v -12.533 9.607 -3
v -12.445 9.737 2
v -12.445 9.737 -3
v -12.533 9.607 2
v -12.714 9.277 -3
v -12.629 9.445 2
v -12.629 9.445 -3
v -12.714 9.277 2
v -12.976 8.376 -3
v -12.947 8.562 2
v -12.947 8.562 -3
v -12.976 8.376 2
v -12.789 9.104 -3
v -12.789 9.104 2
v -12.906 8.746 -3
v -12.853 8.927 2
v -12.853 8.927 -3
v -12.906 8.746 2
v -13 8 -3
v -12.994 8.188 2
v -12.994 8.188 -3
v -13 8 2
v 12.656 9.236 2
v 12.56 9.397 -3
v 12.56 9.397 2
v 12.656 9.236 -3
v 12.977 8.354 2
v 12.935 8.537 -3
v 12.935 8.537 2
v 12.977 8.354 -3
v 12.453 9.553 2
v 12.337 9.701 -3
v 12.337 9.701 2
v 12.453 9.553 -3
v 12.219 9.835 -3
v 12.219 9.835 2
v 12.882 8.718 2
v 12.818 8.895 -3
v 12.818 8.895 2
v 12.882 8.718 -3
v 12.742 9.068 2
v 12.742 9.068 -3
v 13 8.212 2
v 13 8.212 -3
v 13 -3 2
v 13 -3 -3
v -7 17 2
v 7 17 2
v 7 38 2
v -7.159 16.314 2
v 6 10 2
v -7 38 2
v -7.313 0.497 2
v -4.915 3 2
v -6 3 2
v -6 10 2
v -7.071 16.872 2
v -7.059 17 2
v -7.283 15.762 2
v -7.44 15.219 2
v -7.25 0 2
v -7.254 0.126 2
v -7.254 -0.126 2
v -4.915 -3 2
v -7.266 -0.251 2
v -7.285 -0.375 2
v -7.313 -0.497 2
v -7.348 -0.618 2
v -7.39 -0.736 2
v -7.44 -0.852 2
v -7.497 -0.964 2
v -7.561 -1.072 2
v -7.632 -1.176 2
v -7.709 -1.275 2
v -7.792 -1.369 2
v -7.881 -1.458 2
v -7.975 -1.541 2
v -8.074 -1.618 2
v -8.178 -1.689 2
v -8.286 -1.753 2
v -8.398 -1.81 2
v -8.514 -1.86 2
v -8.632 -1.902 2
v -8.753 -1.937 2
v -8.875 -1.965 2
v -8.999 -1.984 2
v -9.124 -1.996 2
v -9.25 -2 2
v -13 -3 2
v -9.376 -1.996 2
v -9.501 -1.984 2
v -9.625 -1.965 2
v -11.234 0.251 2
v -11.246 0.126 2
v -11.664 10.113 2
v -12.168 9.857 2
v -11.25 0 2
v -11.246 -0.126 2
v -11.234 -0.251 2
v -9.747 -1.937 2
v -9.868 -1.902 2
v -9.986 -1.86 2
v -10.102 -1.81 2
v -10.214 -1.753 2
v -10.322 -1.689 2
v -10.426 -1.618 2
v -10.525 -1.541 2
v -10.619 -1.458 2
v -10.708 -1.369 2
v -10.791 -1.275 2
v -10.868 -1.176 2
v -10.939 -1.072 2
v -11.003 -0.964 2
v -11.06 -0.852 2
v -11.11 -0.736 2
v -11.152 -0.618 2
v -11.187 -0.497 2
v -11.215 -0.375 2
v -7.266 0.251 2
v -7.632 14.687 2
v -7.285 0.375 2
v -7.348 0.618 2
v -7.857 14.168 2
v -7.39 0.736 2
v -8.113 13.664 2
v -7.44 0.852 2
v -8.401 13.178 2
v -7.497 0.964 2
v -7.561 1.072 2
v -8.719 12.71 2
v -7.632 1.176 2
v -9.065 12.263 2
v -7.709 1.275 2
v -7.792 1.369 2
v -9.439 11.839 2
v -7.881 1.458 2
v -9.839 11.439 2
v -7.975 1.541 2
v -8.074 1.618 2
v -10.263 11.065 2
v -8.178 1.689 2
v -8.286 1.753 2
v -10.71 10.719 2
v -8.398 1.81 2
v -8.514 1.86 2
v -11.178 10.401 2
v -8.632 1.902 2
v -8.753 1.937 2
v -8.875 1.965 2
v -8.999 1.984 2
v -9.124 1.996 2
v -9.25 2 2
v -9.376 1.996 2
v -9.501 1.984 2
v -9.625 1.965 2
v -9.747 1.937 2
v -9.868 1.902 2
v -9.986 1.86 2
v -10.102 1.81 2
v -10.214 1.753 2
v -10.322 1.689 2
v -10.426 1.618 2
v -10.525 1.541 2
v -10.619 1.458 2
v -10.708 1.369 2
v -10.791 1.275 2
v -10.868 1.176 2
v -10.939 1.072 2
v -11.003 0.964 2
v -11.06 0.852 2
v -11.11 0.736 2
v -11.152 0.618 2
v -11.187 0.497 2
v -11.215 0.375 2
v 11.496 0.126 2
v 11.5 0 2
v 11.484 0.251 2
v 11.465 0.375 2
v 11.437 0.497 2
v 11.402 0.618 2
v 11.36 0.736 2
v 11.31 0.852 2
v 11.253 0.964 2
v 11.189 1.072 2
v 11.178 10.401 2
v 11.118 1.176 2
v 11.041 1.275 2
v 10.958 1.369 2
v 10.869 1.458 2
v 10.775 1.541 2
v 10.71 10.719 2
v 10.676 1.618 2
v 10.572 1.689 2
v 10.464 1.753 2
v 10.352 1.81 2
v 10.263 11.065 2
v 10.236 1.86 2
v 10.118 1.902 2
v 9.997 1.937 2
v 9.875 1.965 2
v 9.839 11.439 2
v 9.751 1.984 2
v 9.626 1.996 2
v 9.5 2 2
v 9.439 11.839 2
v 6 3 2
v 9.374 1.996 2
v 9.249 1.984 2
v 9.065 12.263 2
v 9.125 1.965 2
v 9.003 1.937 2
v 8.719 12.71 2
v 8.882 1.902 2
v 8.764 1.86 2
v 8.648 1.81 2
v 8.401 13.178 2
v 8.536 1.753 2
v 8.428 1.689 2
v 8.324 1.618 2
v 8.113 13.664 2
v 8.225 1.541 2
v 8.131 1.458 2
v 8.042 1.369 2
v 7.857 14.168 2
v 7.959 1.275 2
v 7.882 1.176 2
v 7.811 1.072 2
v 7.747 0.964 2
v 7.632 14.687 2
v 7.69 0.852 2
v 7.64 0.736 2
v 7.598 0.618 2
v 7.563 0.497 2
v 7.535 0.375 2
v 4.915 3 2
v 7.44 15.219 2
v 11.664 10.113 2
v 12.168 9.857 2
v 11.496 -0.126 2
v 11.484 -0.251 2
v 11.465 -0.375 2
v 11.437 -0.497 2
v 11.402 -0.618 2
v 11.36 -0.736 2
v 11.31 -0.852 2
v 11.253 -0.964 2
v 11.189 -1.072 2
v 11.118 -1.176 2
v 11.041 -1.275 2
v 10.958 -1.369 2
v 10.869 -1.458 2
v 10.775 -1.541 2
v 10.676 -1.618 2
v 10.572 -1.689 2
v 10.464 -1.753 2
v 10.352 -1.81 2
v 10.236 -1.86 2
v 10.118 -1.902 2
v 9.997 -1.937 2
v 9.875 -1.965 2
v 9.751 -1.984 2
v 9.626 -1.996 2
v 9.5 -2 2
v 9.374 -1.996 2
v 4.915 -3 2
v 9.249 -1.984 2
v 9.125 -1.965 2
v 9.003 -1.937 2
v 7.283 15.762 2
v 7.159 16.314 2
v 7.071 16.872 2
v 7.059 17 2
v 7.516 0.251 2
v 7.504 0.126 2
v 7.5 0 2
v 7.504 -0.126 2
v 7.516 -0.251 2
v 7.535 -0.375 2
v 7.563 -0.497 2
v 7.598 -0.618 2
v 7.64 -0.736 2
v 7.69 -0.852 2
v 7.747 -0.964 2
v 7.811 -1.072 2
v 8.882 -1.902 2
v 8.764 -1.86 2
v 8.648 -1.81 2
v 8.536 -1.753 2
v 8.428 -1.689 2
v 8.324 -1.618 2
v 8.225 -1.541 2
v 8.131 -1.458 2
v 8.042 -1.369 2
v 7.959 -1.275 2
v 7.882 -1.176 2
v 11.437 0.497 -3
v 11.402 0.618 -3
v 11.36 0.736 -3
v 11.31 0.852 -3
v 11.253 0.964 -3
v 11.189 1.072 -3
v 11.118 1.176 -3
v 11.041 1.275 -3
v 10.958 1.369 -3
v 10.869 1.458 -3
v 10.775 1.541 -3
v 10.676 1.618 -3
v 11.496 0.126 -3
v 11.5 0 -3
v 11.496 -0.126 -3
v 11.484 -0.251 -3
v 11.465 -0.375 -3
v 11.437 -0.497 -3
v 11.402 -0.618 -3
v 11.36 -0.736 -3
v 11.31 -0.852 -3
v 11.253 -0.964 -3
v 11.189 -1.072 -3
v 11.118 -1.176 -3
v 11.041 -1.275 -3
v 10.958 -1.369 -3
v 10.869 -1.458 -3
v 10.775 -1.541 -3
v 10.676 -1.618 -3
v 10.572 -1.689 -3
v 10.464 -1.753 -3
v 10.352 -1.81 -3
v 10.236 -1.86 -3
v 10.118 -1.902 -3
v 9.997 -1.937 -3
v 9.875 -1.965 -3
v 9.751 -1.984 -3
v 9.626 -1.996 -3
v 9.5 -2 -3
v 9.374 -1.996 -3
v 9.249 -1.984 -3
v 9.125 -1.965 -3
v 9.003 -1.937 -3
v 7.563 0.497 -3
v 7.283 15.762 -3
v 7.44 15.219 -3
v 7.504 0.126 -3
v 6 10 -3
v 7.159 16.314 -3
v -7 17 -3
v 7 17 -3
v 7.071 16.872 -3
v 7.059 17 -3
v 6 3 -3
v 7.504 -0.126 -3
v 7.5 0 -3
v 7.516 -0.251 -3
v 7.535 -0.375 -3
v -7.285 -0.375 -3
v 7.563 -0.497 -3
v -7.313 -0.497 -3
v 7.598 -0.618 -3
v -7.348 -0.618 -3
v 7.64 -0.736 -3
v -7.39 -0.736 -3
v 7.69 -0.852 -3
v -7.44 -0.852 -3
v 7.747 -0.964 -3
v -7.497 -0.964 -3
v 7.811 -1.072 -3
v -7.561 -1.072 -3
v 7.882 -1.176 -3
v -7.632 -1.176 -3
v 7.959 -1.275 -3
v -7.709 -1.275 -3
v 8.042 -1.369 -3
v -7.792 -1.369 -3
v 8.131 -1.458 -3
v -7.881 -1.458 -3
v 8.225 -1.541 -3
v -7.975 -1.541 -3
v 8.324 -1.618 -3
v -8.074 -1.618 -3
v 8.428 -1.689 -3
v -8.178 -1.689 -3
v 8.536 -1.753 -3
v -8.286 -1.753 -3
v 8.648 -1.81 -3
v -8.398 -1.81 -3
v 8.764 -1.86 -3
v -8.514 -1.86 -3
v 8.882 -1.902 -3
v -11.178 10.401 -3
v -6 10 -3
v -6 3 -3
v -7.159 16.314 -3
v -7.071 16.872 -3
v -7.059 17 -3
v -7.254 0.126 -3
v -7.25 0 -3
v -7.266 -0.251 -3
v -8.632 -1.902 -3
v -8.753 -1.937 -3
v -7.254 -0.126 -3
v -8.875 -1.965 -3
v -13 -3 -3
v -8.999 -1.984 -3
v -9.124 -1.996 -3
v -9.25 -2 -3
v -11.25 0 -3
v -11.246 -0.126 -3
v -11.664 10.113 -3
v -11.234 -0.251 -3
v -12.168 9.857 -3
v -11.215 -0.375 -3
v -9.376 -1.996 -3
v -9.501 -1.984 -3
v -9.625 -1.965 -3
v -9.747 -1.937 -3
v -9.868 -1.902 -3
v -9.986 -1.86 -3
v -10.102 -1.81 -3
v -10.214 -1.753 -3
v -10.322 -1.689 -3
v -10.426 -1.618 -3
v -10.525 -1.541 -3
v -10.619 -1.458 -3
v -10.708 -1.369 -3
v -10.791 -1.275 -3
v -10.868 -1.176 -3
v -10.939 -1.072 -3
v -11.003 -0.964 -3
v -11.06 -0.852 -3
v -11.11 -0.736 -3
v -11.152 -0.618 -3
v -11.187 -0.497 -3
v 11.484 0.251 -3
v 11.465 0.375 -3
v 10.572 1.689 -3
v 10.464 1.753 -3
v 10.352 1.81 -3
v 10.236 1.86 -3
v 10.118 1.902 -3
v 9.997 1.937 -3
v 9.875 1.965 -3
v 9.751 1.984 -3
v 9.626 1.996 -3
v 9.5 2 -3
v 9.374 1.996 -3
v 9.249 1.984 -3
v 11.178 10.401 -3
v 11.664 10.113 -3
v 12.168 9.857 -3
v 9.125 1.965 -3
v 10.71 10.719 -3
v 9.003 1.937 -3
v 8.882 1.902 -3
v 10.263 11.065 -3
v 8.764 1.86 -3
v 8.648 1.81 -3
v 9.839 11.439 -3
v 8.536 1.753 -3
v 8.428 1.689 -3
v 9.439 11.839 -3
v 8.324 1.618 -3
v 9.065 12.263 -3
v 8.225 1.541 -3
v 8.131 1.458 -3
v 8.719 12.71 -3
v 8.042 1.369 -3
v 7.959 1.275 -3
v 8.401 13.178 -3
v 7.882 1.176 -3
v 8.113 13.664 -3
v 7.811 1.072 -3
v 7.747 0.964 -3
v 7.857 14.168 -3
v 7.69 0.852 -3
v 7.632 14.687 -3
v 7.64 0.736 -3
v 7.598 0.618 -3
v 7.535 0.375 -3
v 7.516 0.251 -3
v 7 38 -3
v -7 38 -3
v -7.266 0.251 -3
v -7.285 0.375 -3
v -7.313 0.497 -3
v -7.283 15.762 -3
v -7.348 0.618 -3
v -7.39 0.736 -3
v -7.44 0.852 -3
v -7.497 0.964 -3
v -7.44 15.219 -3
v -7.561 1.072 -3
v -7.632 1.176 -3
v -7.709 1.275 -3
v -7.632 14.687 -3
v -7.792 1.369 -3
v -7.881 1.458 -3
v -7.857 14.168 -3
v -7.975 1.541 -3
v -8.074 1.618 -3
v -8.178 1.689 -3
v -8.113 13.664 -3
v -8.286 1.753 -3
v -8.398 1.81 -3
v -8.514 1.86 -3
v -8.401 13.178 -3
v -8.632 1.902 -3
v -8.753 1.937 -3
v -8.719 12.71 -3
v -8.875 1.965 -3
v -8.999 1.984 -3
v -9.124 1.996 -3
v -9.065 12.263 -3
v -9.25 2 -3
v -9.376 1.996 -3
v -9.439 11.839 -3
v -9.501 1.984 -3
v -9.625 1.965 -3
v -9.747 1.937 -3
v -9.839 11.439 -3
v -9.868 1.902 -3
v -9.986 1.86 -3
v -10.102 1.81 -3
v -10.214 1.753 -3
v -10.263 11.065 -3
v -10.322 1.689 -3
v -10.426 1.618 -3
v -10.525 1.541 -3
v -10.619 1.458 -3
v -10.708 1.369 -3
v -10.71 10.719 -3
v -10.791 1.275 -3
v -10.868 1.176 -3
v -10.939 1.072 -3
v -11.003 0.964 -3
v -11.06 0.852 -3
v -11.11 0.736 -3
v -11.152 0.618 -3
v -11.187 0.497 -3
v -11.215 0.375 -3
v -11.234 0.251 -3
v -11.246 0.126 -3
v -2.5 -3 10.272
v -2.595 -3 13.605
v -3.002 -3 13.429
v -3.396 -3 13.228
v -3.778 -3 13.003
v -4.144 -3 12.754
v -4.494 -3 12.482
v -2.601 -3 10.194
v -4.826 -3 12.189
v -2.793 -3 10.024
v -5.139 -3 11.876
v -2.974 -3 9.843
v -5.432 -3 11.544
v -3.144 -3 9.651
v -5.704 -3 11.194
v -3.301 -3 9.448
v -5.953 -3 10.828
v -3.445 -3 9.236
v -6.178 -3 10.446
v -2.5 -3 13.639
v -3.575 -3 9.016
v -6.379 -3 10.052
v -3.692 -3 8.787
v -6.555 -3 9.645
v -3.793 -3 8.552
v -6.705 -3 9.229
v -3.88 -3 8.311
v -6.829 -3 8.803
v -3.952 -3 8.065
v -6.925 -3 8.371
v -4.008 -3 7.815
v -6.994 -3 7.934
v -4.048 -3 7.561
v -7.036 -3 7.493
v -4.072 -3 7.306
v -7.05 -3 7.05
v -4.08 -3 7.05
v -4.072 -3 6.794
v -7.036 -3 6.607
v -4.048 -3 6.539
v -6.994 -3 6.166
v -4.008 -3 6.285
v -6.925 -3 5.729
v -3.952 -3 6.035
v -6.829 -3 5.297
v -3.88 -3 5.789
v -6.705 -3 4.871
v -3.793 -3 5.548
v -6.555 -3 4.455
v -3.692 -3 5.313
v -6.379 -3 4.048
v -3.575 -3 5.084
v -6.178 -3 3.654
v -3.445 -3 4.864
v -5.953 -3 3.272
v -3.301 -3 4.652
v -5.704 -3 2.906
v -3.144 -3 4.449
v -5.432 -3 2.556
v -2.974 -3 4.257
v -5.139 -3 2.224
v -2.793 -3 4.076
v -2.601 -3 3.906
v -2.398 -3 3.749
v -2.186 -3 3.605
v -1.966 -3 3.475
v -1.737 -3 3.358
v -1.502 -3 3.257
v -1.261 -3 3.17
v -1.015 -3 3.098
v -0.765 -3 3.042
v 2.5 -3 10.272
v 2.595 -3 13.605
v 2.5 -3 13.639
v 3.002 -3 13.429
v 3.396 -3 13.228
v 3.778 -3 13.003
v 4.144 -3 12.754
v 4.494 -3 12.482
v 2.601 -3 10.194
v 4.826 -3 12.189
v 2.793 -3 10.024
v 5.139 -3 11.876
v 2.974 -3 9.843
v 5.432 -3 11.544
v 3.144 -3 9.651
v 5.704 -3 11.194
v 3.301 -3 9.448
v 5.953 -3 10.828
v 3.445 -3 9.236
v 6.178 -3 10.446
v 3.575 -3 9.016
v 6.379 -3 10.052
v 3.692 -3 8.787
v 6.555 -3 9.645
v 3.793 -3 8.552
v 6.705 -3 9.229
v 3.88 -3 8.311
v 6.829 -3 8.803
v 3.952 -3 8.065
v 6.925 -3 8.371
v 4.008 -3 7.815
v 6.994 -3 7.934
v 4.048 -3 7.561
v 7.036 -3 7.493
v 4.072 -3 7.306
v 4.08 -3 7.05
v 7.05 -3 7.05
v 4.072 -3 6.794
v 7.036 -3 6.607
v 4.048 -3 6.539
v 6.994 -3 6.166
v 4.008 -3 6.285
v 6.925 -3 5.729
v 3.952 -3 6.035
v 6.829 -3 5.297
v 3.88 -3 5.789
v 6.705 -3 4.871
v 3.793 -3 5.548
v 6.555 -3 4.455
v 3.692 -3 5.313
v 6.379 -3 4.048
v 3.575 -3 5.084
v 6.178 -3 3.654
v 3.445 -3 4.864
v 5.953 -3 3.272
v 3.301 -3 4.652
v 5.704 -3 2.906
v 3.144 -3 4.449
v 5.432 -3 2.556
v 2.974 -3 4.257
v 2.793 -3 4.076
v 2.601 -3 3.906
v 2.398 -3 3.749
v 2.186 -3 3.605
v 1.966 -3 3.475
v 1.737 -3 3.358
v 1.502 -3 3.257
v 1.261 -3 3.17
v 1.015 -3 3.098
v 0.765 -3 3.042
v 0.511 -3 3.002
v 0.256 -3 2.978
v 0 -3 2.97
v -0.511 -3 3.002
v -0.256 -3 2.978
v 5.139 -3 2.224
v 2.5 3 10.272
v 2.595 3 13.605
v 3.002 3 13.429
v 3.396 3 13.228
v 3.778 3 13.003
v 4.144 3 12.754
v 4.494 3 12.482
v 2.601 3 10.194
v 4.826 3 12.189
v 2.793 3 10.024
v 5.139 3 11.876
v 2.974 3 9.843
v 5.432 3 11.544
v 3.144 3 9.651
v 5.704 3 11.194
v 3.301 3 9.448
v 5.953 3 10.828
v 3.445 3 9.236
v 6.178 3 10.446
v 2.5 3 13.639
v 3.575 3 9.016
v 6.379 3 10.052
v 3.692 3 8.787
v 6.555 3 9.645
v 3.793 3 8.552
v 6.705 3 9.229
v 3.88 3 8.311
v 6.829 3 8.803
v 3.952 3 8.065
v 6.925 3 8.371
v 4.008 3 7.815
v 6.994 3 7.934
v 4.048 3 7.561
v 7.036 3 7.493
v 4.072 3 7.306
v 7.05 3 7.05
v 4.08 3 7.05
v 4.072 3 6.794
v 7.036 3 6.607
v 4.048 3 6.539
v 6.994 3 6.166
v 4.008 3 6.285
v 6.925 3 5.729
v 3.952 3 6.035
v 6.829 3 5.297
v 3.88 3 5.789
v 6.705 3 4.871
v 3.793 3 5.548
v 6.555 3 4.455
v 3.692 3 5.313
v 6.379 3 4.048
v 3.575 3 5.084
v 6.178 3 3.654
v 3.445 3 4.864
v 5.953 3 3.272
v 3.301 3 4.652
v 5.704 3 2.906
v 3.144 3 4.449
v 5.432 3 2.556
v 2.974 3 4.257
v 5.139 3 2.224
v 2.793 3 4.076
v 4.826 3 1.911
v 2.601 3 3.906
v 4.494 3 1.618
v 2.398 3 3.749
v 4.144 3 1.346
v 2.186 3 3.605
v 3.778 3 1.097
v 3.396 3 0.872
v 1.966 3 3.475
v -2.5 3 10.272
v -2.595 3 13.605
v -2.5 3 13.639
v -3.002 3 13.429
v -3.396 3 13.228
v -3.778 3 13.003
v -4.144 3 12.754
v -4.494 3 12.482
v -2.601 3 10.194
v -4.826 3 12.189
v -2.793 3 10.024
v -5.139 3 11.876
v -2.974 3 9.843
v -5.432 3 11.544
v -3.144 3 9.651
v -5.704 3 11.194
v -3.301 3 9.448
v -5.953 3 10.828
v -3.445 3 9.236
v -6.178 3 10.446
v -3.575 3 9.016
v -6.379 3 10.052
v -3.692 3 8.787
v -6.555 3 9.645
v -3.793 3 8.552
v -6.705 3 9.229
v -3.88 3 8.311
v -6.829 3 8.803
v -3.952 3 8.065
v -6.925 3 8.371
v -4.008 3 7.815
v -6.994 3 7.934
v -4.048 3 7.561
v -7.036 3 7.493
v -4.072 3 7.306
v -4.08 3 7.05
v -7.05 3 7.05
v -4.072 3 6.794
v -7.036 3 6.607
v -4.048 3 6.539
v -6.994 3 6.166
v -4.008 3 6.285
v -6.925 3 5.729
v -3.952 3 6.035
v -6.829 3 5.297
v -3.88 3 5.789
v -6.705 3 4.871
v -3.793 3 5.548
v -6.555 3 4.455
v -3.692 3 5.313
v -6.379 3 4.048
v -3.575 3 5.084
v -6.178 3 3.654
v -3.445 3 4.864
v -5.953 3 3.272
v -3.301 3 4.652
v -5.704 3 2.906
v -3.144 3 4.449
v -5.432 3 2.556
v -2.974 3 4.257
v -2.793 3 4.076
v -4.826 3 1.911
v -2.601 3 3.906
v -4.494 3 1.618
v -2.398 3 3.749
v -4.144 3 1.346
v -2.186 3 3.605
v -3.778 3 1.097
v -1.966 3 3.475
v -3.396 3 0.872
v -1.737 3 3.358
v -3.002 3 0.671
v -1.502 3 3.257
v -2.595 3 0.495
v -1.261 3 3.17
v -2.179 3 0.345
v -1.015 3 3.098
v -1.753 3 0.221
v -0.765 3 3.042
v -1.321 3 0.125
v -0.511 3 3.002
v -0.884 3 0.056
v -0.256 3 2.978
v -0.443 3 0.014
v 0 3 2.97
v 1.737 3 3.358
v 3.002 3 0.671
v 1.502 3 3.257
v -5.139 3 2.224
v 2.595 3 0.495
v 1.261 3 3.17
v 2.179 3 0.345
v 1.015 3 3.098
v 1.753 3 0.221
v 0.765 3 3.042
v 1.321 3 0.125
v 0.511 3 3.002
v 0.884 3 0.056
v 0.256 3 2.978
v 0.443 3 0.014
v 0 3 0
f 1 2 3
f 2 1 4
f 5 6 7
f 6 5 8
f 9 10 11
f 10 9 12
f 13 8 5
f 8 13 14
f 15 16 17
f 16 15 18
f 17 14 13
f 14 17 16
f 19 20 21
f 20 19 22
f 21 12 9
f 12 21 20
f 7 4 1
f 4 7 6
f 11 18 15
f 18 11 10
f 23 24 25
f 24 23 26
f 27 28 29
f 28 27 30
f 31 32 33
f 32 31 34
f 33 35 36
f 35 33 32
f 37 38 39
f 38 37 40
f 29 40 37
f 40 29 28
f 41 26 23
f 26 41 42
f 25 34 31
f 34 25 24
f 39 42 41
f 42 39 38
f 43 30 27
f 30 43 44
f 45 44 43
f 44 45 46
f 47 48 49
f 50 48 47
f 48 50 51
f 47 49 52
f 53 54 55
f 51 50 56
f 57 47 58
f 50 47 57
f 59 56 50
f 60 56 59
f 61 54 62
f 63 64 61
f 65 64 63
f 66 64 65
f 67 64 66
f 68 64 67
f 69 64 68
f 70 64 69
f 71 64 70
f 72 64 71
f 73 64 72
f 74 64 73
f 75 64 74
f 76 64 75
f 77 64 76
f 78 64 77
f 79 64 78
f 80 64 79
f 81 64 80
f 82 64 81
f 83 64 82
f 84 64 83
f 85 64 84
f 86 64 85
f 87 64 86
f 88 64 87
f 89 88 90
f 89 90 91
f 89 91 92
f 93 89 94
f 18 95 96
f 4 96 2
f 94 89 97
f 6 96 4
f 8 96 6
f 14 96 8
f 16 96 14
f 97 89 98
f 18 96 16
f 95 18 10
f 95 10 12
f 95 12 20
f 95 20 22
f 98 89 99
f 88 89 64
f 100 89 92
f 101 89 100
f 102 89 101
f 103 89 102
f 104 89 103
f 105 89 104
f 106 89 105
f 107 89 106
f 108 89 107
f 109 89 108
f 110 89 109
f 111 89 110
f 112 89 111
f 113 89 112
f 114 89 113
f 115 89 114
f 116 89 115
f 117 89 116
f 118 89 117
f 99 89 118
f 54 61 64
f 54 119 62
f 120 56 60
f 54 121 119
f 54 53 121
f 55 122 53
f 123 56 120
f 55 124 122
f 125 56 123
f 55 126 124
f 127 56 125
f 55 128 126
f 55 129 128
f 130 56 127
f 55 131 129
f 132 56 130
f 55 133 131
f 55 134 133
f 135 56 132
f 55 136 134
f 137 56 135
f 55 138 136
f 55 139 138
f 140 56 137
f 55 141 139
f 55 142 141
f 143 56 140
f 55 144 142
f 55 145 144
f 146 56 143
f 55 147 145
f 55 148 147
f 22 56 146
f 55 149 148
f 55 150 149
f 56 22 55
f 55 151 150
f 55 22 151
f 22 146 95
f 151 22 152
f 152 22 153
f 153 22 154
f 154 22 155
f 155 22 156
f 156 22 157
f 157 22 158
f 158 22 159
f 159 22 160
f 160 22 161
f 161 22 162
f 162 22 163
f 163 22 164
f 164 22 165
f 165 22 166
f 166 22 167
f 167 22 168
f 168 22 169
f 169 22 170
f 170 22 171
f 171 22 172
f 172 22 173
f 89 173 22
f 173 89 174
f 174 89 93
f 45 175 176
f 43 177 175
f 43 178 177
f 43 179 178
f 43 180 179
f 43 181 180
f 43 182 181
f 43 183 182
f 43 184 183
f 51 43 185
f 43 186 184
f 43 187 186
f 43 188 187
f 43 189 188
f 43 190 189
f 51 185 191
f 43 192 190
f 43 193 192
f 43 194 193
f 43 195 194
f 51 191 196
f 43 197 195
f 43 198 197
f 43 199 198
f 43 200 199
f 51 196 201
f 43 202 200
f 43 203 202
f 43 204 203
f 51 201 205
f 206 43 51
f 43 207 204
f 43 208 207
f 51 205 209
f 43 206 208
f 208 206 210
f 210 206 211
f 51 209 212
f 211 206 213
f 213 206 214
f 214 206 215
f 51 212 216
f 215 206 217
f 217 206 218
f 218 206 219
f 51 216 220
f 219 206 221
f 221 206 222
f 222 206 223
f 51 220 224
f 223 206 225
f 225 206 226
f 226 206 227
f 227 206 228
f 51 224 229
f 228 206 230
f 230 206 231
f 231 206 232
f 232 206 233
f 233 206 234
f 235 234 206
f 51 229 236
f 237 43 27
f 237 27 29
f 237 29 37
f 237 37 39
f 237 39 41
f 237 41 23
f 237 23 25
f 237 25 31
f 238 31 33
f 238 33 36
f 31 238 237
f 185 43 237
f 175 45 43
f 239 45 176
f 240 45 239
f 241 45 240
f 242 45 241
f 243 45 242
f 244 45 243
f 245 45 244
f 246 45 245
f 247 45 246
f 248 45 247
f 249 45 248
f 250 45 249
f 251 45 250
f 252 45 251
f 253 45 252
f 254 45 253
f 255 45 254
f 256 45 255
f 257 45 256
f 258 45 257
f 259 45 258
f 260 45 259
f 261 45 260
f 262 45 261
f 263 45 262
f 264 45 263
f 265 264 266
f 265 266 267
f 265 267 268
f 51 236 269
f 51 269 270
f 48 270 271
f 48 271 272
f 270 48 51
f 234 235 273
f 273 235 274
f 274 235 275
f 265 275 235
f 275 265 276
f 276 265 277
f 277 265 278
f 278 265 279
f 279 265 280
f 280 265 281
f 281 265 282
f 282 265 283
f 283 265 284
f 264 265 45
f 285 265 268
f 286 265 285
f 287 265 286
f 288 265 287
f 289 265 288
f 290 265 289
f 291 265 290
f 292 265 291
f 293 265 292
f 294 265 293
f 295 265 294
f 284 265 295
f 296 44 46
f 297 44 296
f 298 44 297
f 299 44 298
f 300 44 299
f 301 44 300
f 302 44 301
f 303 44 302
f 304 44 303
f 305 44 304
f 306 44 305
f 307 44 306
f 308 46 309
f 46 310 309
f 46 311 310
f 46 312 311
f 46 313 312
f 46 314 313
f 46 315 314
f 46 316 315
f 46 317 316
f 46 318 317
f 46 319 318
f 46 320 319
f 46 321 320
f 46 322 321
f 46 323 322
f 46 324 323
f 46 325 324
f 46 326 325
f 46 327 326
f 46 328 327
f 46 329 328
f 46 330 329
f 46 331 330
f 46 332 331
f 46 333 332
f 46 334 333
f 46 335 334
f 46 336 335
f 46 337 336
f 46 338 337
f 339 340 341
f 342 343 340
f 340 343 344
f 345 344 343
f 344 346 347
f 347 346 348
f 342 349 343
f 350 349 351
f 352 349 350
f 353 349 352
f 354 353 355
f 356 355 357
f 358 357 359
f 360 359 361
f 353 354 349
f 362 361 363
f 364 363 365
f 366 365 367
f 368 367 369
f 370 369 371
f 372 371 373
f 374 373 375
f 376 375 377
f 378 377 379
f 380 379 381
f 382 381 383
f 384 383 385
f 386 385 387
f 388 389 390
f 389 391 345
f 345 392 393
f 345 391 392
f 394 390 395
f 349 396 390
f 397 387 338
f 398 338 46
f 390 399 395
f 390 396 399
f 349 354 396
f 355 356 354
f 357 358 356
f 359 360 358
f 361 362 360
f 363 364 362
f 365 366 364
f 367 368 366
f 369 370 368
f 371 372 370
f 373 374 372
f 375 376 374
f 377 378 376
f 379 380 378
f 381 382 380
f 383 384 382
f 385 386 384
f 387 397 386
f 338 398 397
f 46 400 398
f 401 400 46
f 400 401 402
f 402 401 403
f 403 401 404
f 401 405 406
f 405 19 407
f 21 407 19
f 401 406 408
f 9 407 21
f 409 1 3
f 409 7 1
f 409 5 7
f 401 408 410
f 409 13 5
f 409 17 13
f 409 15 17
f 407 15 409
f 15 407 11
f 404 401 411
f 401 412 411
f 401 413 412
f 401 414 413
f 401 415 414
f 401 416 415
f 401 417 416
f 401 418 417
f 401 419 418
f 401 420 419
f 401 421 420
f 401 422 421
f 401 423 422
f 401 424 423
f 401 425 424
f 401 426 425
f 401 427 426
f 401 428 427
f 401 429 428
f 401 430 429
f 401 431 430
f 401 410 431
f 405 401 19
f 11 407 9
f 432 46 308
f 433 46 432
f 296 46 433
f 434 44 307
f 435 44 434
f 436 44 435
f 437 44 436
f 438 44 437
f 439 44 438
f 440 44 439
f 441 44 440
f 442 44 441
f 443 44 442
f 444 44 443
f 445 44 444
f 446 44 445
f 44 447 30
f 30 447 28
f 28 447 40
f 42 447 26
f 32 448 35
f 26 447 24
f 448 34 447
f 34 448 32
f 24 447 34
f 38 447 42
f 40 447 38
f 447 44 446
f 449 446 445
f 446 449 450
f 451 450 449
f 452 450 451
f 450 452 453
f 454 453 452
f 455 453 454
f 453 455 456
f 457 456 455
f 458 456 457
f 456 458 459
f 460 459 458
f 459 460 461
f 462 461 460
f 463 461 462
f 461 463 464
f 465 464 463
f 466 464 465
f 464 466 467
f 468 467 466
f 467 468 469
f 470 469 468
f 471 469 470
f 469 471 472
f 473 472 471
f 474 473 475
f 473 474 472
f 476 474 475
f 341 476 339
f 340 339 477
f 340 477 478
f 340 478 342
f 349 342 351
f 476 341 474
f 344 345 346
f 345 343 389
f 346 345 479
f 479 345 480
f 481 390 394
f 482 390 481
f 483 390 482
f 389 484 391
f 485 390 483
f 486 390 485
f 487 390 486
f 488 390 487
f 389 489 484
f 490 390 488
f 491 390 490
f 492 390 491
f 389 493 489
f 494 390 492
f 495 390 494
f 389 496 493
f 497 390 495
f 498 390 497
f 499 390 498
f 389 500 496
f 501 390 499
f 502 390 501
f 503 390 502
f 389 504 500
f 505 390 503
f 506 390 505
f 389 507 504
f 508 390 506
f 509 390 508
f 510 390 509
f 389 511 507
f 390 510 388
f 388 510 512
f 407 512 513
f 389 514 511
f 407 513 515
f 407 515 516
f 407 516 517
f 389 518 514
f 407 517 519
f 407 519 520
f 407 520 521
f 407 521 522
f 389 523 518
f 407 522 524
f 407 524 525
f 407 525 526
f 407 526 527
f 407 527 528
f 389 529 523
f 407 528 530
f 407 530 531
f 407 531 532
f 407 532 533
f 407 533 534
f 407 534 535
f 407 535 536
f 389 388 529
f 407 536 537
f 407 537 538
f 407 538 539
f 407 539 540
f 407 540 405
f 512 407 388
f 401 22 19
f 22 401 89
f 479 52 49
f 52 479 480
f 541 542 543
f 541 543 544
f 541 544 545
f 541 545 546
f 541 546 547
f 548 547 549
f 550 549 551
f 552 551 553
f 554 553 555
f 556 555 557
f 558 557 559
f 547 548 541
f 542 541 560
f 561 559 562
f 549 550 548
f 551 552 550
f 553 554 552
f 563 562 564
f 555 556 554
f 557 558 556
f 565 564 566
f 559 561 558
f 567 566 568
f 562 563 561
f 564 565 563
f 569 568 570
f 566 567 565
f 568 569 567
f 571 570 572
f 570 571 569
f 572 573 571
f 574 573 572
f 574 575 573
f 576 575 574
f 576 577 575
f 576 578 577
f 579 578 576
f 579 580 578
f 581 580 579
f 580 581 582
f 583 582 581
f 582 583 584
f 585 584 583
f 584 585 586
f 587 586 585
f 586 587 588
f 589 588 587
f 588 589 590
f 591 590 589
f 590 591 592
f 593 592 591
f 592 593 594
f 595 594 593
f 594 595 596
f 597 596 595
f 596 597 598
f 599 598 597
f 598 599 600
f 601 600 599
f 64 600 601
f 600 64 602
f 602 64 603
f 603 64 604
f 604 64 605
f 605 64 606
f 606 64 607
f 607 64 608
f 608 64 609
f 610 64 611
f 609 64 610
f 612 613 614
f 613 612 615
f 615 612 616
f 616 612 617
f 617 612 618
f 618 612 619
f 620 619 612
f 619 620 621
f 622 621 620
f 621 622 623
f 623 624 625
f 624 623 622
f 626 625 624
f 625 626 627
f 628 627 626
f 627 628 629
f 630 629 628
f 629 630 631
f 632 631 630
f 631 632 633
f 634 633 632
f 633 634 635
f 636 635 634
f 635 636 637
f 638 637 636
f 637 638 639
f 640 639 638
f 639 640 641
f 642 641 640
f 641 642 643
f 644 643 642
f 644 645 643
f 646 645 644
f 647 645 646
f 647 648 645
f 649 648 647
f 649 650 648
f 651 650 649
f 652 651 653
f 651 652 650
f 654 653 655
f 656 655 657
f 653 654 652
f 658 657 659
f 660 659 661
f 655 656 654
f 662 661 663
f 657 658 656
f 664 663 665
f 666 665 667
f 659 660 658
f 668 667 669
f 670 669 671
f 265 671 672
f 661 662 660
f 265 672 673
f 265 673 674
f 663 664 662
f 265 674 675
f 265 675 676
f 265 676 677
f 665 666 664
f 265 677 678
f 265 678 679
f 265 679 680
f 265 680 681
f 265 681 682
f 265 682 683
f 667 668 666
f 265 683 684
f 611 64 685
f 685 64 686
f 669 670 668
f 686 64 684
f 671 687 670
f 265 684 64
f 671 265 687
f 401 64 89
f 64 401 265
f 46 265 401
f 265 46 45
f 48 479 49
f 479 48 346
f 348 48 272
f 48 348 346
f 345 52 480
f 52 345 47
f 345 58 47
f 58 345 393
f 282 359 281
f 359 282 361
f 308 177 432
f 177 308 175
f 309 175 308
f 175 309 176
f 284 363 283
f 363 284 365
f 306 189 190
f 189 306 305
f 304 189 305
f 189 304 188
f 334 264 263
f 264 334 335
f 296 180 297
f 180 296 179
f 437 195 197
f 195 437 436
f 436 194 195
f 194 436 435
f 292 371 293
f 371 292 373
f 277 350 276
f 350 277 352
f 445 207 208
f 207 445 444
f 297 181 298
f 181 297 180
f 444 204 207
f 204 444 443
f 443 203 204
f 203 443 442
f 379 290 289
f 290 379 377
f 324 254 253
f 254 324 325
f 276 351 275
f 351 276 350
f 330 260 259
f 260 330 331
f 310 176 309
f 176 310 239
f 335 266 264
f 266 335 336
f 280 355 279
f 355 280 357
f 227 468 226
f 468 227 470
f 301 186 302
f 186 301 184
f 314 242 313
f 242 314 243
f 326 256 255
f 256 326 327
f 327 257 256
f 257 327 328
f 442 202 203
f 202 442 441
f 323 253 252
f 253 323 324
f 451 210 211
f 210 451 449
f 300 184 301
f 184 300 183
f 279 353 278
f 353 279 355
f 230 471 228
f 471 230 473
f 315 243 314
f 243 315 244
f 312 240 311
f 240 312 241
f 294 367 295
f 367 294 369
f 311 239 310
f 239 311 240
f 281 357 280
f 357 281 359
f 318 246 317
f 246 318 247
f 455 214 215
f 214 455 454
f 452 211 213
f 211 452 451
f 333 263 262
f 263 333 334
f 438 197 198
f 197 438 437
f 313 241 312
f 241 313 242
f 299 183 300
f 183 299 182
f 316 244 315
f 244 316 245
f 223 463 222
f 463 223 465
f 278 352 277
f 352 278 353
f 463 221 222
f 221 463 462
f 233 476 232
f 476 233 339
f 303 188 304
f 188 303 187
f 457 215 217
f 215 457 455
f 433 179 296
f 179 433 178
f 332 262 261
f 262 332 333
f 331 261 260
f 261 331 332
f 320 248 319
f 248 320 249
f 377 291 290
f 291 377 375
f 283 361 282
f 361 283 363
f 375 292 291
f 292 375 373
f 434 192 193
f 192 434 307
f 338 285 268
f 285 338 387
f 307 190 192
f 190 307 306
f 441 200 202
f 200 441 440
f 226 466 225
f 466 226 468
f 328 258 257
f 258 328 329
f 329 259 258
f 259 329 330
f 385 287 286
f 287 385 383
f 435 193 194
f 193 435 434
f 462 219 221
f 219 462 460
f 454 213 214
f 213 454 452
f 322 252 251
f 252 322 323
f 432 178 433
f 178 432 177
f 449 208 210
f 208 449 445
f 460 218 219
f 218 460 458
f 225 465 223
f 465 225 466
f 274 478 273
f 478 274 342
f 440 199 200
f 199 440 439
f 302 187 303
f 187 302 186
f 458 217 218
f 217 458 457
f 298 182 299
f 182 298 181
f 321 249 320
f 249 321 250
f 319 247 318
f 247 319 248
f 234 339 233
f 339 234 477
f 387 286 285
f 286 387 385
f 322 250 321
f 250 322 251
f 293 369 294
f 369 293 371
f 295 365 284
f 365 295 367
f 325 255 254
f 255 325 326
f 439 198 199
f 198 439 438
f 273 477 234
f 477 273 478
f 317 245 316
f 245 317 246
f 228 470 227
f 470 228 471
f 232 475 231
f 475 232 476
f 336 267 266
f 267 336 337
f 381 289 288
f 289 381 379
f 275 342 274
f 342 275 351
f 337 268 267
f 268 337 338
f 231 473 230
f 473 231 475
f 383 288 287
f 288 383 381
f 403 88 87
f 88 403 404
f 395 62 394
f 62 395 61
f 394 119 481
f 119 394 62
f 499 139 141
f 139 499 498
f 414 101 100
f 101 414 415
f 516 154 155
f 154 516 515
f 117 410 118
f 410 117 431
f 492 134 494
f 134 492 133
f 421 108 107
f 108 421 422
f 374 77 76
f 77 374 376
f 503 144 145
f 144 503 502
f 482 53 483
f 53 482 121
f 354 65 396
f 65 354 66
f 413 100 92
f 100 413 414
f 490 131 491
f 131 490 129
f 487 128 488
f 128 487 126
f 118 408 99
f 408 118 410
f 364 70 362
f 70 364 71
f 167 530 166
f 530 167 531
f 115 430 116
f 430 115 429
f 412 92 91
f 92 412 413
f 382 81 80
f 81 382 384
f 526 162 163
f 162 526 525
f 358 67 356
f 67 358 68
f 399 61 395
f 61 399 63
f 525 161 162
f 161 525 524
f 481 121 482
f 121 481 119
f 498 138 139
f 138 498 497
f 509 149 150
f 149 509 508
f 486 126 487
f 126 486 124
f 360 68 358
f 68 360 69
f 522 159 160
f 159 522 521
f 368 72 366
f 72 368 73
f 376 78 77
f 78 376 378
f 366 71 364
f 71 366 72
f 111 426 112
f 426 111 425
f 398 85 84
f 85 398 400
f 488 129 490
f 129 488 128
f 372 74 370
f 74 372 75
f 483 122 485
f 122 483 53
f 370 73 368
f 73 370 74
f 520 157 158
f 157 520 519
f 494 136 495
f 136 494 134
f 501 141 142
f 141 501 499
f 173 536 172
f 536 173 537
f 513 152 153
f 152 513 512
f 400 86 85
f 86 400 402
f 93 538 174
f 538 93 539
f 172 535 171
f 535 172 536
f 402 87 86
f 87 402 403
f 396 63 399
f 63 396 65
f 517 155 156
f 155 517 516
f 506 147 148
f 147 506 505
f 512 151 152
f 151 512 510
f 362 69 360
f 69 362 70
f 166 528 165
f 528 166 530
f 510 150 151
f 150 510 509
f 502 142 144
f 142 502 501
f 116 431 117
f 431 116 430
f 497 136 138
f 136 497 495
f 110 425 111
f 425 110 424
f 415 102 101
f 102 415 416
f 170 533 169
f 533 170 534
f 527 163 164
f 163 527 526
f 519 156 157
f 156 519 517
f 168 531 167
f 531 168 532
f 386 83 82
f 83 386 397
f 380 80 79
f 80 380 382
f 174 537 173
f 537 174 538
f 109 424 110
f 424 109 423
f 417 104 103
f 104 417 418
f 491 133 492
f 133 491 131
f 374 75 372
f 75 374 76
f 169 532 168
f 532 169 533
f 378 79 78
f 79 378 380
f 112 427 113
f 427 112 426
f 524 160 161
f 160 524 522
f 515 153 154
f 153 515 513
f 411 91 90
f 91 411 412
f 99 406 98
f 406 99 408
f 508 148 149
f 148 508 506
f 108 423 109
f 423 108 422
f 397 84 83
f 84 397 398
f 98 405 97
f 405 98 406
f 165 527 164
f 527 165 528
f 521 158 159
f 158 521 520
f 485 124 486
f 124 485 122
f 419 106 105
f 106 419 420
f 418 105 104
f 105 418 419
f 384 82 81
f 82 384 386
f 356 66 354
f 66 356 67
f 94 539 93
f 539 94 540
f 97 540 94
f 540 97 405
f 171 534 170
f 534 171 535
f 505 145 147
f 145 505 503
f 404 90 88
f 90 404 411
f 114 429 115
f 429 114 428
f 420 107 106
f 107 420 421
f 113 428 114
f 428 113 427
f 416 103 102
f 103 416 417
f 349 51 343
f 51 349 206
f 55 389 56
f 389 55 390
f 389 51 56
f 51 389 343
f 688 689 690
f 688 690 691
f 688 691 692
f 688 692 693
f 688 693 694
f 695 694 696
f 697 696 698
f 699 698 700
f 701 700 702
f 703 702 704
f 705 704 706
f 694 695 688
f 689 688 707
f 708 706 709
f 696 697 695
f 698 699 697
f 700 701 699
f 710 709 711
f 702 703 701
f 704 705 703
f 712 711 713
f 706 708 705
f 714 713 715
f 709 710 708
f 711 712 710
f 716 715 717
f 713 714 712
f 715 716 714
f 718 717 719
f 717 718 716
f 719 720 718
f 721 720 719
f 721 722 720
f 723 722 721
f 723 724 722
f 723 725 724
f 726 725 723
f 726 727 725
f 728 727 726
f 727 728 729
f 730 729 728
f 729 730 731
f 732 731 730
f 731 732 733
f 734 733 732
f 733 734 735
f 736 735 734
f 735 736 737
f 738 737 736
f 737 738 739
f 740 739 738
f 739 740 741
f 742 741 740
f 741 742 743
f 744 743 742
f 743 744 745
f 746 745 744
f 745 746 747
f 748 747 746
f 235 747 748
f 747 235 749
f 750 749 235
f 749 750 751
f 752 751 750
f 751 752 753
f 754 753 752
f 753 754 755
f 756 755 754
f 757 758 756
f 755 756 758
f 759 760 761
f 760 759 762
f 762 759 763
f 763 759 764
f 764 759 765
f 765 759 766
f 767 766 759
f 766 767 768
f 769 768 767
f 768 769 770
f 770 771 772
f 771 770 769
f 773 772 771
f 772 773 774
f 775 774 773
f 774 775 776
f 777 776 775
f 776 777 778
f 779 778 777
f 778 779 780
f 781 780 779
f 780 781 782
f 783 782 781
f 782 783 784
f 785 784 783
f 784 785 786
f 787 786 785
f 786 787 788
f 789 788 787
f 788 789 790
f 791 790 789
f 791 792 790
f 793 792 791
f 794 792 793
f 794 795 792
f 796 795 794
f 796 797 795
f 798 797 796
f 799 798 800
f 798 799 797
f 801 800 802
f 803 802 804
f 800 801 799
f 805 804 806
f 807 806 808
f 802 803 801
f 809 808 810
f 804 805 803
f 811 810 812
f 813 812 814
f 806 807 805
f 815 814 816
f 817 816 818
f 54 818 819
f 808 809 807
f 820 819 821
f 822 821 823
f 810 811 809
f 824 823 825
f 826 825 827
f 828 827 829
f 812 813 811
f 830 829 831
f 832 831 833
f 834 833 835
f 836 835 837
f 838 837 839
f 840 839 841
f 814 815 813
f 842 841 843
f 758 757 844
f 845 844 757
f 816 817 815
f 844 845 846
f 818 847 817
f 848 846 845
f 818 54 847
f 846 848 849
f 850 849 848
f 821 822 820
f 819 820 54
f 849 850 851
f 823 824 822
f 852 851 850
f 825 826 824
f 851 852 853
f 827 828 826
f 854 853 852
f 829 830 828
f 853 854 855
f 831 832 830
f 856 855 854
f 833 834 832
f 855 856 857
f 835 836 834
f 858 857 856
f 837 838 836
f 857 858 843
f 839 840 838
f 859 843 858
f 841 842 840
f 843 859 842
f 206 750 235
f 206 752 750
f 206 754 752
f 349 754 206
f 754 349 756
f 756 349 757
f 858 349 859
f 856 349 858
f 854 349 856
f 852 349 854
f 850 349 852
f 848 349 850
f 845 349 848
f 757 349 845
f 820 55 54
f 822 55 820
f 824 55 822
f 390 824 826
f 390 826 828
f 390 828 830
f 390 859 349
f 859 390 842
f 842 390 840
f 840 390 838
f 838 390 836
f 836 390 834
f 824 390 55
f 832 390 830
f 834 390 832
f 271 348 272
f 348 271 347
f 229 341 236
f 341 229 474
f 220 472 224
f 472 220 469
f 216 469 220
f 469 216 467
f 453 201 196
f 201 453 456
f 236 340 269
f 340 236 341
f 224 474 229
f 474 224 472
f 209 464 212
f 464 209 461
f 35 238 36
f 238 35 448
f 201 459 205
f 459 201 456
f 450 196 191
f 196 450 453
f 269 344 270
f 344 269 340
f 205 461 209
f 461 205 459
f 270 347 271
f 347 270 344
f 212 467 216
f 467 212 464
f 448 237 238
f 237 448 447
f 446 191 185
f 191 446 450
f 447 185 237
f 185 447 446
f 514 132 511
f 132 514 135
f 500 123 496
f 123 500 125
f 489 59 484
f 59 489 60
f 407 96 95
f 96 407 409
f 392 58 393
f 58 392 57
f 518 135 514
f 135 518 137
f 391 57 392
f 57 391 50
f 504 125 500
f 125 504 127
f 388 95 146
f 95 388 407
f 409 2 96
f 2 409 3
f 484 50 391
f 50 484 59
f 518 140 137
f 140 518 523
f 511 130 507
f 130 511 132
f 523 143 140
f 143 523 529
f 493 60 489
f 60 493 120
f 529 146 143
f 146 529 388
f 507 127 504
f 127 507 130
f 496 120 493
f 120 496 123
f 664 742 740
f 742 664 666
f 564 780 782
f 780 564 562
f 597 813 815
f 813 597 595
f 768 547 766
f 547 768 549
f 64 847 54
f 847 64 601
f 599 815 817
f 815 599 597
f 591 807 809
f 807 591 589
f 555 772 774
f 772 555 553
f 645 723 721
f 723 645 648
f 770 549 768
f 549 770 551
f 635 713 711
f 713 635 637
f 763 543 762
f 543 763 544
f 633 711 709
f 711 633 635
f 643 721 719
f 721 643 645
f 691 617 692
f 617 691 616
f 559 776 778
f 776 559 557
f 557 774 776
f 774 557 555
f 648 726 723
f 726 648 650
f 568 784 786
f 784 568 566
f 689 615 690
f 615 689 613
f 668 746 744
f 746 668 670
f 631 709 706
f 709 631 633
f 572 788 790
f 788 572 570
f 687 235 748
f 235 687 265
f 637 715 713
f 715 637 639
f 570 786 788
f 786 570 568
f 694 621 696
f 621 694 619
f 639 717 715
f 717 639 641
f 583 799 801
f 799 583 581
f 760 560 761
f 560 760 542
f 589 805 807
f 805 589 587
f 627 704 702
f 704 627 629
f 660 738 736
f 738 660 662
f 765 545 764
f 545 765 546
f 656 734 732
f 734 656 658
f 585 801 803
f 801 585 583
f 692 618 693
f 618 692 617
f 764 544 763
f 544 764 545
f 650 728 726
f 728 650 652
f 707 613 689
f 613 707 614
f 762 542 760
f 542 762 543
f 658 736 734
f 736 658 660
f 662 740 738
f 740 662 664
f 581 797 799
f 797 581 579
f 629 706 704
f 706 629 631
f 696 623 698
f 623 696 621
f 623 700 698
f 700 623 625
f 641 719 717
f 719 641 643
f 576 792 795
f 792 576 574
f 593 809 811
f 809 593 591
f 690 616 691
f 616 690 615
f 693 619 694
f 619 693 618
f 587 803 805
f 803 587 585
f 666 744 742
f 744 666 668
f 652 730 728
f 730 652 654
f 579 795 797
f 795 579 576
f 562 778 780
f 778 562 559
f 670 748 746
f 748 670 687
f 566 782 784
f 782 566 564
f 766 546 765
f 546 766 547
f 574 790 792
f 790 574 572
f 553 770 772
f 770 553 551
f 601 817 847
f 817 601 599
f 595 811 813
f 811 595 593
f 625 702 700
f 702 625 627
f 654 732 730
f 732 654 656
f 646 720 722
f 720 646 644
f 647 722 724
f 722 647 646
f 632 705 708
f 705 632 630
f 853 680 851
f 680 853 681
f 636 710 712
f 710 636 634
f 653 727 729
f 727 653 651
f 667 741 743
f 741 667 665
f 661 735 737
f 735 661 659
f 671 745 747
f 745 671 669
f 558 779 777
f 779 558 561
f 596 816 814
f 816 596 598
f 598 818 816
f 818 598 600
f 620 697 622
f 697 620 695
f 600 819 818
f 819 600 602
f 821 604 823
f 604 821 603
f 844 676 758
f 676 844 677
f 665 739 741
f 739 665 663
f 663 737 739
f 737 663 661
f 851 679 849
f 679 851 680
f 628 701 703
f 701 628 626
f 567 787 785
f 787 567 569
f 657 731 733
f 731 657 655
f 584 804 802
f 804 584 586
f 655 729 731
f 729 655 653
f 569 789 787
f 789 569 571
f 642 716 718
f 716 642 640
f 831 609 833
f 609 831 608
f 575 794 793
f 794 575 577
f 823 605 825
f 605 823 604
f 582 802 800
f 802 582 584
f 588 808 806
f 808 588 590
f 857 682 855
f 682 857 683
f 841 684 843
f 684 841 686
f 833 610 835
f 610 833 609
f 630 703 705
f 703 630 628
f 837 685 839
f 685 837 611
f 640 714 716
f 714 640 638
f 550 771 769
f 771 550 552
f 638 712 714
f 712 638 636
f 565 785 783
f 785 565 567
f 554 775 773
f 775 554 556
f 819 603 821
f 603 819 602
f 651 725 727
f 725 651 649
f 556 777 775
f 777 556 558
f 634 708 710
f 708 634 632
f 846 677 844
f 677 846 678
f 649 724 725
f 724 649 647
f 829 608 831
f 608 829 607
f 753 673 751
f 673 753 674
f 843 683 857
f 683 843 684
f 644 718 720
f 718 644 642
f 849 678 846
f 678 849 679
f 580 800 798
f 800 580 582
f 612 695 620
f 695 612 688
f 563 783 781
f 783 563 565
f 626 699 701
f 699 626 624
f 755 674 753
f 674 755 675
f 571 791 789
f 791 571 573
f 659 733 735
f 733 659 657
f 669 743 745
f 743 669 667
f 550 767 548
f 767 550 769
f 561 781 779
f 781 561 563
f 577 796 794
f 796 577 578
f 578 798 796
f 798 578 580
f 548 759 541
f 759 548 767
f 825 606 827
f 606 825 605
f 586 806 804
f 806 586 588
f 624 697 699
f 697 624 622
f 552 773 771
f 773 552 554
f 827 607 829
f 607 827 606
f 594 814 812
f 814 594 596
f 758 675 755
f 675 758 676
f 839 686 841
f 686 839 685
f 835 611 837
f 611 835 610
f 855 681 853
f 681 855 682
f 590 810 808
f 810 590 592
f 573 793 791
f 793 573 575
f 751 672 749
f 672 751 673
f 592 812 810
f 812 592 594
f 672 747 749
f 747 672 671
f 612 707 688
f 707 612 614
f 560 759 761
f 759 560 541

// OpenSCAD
//---------------------------------------------------------------
//--  Eje Z final de carrera.  (c) Pedro de Oro Martín
//---------------------------------------------------------------
//-- Released under the GPL license
//---------------------------------------------------------------


//-- Chaflan cilíndrico

module chaflan(){

	difference(){
		cylinder(h=30,r=3,$fn=100,center=true);

		translate([3,0,0])
		cylinder(h=30,r=3,$fn=100,center=true);
		
		translate([0,-5,0])
		cube([10,10,40], center=true);
	}
}

//-- Cuerpo

difference()
{
	translate([0,17.5,-0.5])
	cube(size=[26,41,5], center=true);

	translate([20,37.5,0])
	cube(size=[26,41,6], center=true);

	translate([-20,37.5,0])
	cube(size=[26,41,6], center=true);

	translate([9.5,0,-1])
	cylinder(h=35, r=2,center=true, $fn=100);

	translate([-9.25,0,-1])
	cylinder(h=35, r=2,center=true, $fn=100);

	translate([-13,8,0])
	chaflan();
	
	translate([11.3,10.5,0])
	rotate([0,0,245])chaflan();

//agujero para soldaduras

			translate([0,6.5,0])
			cube(size=[12,7,10], center=true);

//curvas esteticas

			translate([16,18,0])
			cylinder(h=30,r=9,$fn=100,center=true);

			translate([-16,18,0])
			cylinder(h=30,r=9,$fn=100,center=true);
		}


//-- Sujección varilla

difference()
{

  translate([0,3,7.05])
  rotate([90,0,0])
  cylinder(h=6, r=7.05, $fn=100);

  translate([0,5,7.05]) 
  rotate([90,0,0])
  cylinder(h=10, r=4.08, $fn=100);

  translate([0,0,11])
  cube(size=[5,8,10], center=true);	
}
